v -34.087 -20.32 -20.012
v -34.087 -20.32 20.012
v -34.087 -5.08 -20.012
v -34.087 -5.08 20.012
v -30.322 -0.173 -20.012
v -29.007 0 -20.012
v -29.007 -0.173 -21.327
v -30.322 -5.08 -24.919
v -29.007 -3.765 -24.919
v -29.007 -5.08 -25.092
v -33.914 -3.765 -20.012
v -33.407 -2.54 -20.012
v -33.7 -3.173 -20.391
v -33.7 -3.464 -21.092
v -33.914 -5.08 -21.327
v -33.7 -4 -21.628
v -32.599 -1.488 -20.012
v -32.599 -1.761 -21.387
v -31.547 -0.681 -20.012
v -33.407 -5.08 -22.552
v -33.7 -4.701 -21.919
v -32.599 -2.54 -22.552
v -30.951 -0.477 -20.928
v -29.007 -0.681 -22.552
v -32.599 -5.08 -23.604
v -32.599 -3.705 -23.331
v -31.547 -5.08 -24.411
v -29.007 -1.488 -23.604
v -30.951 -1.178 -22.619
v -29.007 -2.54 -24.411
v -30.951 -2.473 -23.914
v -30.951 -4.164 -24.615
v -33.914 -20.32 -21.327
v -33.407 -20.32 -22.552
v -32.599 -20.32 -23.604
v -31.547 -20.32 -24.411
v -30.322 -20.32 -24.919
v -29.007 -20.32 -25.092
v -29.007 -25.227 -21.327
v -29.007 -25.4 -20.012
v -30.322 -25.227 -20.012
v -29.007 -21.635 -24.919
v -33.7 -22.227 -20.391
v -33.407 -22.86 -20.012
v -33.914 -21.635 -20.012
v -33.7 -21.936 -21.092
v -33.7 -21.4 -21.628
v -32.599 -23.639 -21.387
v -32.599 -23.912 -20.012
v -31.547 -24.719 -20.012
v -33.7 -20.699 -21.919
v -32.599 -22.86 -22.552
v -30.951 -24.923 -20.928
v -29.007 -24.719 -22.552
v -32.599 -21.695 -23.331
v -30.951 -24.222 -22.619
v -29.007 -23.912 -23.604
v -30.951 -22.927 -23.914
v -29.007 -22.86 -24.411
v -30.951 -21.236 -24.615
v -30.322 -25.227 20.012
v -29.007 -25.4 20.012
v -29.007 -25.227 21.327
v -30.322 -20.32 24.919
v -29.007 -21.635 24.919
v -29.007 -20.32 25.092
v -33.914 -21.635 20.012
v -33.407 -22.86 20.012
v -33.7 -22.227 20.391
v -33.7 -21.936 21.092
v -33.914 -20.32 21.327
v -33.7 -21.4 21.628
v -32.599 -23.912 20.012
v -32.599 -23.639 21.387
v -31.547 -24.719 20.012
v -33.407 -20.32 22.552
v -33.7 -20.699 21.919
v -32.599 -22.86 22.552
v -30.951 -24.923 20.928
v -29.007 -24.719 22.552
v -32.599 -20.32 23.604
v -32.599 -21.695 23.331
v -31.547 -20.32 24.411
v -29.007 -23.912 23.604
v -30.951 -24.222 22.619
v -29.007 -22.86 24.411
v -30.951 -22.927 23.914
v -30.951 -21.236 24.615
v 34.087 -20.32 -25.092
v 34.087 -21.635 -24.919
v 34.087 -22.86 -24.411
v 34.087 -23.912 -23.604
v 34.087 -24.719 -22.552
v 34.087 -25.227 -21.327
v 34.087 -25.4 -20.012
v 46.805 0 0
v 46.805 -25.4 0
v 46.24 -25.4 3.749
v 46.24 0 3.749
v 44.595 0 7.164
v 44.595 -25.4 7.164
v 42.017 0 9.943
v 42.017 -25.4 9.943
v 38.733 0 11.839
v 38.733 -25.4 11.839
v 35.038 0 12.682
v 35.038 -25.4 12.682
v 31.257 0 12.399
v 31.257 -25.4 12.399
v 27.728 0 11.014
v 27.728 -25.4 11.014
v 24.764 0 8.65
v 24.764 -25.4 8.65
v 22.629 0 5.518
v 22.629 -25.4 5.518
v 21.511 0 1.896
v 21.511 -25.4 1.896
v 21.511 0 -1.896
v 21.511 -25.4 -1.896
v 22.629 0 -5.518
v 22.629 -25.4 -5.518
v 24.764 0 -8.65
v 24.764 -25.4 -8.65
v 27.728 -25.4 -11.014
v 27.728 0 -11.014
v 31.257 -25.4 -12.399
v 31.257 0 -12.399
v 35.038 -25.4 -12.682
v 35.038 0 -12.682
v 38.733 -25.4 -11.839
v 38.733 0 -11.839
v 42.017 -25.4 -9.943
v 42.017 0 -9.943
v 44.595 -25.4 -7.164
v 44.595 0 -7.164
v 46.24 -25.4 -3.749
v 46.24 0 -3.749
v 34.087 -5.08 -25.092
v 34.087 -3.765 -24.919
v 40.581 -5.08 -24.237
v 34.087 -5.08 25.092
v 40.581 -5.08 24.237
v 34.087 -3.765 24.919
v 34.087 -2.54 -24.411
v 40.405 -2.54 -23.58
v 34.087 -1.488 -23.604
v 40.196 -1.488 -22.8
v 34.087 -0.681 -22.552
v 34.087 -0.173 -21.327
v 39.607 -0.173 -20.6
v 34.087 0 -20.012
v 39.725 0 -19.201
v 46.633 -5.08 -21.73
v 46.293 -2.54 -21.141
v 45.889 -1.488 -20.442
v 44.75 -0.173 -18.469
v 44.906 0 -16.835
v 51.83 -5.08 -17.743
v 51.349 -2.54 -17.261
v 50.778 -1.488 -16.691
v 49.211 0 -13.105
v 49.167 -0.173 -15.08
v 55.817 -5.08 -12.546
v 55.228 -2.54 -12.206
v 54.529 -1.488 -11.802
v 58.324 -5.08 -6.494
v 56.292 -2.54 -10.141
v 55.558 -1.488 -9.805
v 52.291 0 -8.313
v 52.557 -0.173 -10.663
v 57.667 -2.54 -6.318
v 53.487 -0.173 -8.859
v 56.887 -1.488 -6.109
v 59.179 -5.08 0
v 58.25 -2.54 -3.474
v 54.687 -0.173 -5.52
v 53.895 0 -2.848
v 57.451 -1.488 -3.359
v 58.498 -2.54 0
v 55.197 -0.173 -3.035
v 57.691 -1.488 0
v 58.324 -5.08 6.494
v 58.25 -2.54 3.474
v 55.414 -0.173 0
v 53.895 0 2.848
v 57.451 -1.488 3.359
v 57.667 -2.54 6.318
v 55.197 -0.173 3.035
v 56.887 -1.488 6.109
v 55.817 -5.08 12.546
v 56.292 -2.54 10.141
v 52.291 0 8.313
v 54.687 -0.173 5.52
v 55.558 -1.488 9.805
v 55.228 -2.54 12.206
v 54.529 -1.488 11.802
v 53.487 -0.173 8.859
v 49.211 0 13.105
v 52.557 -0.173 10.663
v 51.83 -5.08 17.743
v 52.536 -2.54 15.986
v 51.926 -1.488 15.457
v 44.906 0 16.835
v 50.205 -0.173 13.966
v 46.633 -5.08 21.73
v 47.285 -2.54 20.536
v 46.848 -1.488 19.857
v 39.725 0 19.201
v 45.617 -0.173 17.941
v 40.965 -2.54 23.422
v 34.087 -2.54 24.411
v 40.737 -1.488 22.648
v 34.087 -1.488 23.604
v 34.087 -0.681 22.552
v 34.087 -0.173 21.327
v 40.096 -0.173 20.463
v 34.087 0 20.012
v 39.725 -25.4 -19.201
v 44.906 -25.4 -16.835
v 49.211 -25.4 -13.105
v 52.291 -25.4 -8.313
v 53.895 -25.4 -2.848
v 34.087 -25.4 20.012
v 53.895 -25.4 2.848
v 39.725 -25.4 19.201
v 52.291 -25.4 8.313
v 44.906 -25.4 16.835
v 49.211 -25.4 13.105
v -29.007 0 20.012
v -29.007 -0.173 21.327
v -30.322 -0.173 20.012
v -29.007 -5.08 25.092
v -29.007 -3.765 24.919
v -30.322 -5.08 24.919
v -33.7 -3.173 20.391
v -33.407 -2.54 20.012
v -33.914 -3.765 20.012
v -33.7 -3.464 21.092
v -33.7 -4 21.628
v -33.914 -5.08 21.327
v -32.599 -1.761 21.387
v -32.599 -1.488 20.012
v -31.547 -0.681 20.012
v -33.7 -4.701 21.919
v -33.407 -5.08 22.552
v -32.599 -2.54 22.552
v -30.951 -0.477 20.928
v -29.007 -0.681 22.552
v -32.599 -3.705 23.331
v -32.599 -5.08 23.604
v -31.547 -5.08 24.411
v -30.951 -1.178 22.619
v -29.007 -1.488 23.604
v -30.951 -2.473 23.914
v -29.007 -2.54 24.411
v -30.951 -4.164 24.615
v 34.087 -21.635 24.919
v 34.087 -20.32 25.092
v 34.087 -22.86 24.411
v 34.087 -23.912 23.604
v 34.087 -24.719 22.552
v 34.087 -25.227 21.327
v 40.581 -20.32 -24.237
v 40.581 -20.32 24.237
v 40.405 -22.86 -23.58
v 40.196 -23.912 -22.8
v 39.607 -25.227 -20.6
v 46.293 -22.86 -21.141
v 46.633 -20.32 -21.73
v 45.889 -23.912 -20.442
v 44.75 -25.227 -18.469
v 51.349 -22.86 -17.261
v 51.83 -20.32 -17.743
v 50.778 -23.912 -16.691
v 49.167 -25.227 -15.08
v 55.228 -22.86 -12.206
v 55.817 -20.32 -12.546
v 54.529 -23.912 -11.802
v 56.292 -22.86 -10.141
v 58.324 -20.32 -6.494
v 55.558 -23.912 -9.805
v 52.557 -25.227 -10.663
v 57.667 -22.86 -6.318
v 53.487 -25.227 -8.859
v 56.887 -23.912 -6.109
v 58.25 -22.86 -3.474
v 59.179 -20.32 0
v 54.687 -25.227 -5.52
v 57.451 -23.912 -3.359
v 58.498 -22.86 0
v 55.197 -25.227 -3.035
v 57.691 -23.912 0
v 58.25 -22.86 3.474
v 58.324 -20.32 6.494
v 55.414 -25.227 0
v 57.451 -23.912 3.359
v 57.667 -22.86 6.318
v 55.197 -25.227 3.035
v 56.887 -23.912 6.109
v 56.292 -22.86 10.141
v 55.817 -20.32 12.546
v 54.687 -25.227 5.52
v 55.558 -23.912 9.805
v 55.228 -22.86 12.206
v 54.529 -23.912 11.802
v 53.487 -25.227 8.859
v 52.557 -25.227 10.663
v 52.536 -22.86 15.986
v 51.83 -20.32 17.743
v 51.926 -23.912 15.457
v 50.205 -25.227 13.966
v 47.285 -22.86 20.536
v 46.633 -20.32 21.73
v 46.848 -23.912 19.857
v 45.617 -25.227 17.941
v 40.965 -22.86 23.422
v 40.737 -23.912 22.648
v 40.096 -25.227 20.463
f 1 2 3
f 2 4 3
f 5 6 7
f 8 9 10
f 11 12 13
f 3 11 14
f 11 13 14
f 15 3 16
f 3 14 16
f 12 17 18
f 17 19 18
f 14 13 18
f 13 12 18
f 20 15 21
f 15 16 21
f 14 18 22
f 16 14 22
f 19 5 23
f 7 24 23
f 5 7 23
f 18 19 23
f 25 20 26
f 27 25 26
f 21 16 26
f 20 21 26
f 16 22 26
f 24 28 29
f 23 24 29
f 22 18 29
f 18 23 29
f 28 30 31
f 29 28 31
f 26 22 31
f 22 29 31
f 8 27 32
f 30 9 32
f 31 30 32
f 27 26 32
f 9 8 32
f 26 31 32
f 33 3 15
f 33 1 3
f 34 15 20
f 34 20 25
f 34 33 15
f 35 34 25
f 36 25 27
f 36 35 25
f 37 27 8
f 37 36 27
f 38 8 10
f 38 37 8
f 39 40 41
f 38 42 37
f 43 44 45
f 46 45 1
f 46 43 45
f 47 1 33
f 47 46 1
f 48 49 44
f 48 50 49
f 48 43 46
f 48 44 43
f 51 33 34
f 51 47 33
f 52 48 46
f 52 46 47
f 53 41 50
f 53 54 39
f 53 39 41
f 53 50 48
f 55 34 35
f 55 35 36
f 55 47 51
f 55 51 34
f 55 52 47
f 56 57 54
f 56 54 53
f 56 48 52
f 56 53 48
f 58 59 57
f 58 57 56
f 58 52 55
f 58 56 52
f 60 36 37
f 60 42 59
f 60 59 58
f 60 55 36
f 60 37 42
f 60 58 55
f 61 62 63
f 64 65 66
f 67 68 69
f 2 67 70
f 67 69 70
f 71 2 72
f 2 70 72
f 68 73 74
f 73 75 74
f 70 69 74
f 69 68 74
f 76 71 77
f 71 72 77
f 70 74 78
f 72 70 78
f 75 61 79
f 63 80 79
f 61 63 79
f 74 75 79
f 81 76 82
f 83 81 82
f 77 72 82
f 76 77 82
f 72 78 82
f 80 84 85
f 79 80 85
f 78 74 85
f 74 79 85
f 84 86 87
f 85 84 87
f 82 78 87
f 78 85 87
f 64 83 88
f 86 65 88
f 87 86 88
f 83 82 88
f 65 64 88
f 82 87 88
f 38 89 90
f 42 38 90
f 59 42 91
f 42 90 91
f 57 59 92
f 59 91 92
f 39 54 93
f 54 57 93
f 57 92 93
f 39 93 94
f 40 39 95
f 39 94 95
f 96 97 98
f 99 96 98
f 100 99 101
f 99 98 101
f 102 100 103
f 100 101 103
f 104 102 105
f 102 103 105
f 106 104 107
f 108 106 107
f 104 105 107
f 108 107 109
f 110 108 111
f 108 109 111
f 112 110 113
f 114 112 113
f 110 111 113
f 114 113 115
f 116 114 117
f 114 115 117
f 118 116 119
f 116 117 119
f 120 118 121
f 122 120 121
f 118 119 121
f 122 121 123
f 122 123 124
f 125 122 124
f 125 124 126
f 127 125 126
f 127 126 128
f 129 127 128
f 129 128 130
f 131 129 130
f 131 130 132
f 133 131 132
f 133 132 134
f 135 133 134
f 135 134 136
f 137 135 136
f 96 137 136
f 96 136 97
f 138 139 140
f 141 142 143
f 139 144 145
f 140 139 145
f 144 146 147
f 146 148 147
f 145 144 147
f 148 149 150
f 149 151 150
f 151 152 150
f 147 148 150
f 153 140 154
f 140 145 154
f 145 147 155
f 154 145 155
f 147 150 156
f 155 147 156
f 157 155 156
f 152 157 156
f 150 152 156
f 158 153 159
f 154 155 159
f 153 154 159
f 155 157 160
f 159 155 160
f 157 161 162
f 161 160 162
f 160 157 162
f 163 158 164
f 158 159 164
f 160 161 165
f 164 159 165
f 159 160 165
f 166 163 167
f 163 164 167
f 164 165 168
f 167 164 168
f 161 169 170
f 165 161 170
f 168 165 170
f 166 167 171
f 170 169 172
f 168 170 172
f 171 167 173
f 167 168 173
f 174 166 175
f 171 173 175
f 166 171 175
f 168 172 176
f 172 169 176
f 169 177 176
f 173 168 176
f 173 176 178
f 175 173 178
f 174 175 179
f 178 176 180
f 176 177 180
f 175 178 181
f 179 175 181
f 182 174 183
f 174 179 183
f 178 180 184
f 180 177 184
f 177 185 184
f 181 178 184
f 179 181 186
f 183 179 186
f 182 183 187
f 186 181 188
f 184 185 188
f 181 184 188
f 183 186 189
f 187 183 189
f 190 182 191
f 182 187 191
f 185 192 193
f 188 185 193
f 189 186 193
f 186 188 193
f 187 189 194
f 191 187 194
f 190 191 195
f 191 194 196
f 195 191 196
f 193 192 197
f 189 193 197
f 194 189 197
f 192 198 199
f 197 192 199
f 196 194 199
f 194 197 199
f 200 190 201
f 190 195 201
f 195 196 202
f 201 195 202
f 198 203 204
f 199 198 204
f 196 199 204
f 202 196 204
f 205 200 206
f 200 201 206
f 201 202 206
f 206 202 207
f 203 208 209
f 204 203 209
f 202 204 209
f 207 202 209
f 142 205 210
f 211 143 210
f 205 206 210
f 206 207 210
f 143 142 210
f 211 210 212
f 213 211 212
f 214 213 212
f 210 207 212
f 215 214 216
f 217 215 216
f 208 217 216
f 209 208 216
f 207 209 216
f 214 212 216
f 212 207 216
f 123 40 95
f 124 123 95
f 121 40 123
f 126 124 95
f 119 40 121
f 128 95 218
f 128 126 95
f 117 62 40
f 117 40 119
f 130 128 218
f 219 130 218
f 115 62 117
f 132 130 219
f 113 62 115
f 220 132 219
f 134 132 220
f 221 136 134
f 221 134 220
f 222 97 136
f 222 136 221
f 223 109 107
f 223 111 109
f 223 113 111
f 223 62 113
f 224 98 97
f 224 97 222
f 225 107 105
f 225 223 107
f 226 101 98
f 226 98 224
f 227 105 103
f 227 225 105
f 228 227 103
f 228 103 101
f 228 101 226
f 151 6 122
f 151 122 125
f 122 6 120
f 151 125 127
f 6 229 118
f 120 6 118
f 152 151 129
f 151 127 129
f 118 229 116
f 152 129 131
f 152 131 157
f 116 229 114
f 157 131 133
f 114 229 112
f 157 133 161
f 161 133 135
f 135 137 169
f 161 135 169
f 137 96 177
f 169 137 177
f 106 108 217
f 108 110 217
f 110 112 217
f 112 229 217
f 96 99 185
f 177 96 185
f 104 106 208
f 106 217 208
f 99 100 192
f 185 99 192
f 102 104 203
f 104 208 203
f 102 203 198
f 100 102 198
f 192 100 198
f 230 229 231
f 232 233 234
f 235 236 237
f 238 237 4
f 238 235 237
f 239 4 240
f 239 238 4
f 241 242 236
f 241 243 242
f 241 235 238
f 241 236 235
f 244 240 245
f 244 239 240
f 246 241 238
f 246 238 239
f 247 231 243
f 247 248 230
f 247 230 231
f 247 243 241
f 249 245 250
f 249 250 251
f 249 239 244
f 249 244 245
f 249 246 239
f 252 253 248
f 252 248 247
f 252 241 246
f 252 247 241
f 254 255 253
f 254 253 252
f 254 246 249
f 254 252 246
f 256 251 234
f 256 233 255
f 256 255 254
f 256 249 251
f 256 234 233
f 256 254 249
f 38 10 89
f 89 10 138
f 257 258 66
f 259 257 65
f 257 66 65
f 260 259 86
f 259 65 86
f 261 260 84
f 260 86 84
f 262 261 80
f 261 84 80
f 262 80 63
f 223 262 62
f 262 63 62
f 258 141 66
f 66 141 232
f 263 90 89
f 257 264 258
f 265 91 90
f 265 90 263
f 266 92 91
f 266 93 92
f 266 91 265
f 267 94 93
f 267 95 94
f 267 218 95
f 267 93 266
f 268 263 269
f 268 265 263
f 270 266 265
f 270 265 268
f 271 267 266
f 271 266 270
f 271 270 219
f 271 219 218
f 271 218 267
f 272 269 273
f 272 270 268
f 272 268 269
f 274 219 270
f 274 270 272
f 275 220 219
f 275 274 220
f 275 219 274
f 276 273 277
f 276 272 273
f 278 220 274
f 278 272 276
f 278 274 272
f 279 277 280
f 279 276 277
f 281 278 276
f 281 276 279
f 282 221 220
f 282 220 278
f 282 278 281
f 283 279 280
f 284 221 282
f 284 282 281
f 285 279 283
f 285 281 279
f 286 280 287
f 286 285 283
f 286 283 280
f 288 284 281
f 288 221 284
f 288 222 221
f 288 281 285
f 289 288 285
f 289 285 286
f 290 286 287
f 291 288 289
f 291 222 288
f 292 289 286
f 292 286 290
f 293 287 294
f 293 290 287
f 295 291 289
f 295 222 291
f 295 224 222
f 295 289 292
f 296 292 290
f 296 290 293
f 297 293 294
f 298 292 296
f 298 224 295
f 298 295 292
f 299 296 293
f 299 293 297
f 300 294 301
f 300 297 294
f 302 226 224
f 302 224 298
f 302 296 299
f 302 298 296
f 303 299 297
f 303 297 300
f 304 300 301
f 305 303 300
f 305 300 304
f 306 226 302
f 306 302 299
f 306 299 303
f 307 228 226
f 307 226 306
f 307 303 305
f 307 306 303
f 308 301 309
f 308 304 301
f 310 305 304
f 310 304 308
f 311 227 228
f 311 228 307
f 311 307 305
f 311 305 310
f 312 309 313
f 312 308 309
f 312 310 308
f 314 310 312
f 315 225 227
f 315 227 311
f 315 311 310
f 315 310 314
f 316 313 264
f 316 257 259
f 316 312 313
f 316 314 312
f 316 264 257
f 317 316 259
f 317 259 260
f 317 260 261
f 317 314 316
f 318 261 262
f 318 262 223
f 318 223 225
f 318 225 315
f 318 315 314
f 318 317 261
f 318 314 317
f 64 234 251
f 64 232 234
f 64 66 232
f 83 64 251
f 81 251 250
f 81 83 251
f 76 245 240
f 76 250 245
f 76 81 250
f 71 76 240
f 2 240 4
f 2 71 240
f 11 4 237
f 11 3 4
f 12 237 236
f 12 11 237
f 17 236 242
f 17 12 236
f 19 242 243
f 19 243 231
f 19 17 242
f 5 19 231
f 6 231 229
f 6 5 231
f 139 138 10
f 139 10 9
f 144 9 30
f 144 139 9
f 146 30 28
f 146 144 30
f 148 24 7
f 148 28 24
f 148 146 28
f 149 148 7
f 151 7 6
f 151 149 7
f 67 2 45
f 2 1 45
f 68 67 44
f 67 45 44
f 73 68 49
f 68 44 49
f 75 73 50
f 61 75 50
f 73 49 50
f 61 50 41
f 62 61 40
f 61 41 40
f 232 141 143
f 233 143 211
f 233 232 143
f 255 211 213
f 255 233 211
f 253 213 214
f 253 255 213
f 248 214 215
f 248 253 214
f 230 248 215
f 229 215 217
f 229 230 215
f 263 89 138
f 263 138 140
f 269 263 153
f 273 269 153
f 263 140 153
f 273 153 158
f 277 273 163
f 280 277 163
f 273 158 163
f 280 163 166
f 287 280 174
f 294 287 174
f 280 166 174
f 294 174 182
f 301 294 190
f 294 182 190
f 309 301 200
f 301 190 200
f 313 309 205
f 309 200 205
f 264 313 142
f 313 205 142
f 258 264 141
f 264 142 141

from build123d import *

# Parameters (mm, degrees)
F1_DEPTH = 25.4
F2_R     = 5.08
F3_R     = 12.717972
F4_DEPTH = 25.401


with BuildPart() as f1:
    # F0 (on Front) → F1 (new body)
    with BuildSketch(Plane.XZ):
        with BuildLine():
            ThreePointArc((34.087103, -25.091894), (59.178997, 0), (34.087103, 25.091894))
            Line((34.087103, 25.091894), (-34.087103, 25.091894))
            Line((-34.087103, 25.091894), (-34.087103, -25.091894))
            Line((-34.087103, -25.091894), (34.087103, -25.091894))
        make_face()
    extrude(amount=F1_DEPTH)

    # F2
    f2_edges = [f1.edges().sort_by_distance(p)[0] for p in [
        (0, -25.4, 25.091894),
        (-34.087103, -25.4, 0),
        (0, 0, -25.091894),
        (-34.087103, 0, 0),
        (-34.087103, -12.7, -25.091894),
        (-34.087103, -12.7, 25.091894),
    ]]
    fillet(f2_edges, radius=F2_R)

    # F3 (on face) → F4 (cut, through all)
    with BuildSketch(Plane.XZ.offset(25.4)):
        with Locations((34.087103, 0)):
            Circle(F3_R)
    extrude(amount=-F4_DEPTH, mode=Mode.SUBTRACT)


solid = f1.part
